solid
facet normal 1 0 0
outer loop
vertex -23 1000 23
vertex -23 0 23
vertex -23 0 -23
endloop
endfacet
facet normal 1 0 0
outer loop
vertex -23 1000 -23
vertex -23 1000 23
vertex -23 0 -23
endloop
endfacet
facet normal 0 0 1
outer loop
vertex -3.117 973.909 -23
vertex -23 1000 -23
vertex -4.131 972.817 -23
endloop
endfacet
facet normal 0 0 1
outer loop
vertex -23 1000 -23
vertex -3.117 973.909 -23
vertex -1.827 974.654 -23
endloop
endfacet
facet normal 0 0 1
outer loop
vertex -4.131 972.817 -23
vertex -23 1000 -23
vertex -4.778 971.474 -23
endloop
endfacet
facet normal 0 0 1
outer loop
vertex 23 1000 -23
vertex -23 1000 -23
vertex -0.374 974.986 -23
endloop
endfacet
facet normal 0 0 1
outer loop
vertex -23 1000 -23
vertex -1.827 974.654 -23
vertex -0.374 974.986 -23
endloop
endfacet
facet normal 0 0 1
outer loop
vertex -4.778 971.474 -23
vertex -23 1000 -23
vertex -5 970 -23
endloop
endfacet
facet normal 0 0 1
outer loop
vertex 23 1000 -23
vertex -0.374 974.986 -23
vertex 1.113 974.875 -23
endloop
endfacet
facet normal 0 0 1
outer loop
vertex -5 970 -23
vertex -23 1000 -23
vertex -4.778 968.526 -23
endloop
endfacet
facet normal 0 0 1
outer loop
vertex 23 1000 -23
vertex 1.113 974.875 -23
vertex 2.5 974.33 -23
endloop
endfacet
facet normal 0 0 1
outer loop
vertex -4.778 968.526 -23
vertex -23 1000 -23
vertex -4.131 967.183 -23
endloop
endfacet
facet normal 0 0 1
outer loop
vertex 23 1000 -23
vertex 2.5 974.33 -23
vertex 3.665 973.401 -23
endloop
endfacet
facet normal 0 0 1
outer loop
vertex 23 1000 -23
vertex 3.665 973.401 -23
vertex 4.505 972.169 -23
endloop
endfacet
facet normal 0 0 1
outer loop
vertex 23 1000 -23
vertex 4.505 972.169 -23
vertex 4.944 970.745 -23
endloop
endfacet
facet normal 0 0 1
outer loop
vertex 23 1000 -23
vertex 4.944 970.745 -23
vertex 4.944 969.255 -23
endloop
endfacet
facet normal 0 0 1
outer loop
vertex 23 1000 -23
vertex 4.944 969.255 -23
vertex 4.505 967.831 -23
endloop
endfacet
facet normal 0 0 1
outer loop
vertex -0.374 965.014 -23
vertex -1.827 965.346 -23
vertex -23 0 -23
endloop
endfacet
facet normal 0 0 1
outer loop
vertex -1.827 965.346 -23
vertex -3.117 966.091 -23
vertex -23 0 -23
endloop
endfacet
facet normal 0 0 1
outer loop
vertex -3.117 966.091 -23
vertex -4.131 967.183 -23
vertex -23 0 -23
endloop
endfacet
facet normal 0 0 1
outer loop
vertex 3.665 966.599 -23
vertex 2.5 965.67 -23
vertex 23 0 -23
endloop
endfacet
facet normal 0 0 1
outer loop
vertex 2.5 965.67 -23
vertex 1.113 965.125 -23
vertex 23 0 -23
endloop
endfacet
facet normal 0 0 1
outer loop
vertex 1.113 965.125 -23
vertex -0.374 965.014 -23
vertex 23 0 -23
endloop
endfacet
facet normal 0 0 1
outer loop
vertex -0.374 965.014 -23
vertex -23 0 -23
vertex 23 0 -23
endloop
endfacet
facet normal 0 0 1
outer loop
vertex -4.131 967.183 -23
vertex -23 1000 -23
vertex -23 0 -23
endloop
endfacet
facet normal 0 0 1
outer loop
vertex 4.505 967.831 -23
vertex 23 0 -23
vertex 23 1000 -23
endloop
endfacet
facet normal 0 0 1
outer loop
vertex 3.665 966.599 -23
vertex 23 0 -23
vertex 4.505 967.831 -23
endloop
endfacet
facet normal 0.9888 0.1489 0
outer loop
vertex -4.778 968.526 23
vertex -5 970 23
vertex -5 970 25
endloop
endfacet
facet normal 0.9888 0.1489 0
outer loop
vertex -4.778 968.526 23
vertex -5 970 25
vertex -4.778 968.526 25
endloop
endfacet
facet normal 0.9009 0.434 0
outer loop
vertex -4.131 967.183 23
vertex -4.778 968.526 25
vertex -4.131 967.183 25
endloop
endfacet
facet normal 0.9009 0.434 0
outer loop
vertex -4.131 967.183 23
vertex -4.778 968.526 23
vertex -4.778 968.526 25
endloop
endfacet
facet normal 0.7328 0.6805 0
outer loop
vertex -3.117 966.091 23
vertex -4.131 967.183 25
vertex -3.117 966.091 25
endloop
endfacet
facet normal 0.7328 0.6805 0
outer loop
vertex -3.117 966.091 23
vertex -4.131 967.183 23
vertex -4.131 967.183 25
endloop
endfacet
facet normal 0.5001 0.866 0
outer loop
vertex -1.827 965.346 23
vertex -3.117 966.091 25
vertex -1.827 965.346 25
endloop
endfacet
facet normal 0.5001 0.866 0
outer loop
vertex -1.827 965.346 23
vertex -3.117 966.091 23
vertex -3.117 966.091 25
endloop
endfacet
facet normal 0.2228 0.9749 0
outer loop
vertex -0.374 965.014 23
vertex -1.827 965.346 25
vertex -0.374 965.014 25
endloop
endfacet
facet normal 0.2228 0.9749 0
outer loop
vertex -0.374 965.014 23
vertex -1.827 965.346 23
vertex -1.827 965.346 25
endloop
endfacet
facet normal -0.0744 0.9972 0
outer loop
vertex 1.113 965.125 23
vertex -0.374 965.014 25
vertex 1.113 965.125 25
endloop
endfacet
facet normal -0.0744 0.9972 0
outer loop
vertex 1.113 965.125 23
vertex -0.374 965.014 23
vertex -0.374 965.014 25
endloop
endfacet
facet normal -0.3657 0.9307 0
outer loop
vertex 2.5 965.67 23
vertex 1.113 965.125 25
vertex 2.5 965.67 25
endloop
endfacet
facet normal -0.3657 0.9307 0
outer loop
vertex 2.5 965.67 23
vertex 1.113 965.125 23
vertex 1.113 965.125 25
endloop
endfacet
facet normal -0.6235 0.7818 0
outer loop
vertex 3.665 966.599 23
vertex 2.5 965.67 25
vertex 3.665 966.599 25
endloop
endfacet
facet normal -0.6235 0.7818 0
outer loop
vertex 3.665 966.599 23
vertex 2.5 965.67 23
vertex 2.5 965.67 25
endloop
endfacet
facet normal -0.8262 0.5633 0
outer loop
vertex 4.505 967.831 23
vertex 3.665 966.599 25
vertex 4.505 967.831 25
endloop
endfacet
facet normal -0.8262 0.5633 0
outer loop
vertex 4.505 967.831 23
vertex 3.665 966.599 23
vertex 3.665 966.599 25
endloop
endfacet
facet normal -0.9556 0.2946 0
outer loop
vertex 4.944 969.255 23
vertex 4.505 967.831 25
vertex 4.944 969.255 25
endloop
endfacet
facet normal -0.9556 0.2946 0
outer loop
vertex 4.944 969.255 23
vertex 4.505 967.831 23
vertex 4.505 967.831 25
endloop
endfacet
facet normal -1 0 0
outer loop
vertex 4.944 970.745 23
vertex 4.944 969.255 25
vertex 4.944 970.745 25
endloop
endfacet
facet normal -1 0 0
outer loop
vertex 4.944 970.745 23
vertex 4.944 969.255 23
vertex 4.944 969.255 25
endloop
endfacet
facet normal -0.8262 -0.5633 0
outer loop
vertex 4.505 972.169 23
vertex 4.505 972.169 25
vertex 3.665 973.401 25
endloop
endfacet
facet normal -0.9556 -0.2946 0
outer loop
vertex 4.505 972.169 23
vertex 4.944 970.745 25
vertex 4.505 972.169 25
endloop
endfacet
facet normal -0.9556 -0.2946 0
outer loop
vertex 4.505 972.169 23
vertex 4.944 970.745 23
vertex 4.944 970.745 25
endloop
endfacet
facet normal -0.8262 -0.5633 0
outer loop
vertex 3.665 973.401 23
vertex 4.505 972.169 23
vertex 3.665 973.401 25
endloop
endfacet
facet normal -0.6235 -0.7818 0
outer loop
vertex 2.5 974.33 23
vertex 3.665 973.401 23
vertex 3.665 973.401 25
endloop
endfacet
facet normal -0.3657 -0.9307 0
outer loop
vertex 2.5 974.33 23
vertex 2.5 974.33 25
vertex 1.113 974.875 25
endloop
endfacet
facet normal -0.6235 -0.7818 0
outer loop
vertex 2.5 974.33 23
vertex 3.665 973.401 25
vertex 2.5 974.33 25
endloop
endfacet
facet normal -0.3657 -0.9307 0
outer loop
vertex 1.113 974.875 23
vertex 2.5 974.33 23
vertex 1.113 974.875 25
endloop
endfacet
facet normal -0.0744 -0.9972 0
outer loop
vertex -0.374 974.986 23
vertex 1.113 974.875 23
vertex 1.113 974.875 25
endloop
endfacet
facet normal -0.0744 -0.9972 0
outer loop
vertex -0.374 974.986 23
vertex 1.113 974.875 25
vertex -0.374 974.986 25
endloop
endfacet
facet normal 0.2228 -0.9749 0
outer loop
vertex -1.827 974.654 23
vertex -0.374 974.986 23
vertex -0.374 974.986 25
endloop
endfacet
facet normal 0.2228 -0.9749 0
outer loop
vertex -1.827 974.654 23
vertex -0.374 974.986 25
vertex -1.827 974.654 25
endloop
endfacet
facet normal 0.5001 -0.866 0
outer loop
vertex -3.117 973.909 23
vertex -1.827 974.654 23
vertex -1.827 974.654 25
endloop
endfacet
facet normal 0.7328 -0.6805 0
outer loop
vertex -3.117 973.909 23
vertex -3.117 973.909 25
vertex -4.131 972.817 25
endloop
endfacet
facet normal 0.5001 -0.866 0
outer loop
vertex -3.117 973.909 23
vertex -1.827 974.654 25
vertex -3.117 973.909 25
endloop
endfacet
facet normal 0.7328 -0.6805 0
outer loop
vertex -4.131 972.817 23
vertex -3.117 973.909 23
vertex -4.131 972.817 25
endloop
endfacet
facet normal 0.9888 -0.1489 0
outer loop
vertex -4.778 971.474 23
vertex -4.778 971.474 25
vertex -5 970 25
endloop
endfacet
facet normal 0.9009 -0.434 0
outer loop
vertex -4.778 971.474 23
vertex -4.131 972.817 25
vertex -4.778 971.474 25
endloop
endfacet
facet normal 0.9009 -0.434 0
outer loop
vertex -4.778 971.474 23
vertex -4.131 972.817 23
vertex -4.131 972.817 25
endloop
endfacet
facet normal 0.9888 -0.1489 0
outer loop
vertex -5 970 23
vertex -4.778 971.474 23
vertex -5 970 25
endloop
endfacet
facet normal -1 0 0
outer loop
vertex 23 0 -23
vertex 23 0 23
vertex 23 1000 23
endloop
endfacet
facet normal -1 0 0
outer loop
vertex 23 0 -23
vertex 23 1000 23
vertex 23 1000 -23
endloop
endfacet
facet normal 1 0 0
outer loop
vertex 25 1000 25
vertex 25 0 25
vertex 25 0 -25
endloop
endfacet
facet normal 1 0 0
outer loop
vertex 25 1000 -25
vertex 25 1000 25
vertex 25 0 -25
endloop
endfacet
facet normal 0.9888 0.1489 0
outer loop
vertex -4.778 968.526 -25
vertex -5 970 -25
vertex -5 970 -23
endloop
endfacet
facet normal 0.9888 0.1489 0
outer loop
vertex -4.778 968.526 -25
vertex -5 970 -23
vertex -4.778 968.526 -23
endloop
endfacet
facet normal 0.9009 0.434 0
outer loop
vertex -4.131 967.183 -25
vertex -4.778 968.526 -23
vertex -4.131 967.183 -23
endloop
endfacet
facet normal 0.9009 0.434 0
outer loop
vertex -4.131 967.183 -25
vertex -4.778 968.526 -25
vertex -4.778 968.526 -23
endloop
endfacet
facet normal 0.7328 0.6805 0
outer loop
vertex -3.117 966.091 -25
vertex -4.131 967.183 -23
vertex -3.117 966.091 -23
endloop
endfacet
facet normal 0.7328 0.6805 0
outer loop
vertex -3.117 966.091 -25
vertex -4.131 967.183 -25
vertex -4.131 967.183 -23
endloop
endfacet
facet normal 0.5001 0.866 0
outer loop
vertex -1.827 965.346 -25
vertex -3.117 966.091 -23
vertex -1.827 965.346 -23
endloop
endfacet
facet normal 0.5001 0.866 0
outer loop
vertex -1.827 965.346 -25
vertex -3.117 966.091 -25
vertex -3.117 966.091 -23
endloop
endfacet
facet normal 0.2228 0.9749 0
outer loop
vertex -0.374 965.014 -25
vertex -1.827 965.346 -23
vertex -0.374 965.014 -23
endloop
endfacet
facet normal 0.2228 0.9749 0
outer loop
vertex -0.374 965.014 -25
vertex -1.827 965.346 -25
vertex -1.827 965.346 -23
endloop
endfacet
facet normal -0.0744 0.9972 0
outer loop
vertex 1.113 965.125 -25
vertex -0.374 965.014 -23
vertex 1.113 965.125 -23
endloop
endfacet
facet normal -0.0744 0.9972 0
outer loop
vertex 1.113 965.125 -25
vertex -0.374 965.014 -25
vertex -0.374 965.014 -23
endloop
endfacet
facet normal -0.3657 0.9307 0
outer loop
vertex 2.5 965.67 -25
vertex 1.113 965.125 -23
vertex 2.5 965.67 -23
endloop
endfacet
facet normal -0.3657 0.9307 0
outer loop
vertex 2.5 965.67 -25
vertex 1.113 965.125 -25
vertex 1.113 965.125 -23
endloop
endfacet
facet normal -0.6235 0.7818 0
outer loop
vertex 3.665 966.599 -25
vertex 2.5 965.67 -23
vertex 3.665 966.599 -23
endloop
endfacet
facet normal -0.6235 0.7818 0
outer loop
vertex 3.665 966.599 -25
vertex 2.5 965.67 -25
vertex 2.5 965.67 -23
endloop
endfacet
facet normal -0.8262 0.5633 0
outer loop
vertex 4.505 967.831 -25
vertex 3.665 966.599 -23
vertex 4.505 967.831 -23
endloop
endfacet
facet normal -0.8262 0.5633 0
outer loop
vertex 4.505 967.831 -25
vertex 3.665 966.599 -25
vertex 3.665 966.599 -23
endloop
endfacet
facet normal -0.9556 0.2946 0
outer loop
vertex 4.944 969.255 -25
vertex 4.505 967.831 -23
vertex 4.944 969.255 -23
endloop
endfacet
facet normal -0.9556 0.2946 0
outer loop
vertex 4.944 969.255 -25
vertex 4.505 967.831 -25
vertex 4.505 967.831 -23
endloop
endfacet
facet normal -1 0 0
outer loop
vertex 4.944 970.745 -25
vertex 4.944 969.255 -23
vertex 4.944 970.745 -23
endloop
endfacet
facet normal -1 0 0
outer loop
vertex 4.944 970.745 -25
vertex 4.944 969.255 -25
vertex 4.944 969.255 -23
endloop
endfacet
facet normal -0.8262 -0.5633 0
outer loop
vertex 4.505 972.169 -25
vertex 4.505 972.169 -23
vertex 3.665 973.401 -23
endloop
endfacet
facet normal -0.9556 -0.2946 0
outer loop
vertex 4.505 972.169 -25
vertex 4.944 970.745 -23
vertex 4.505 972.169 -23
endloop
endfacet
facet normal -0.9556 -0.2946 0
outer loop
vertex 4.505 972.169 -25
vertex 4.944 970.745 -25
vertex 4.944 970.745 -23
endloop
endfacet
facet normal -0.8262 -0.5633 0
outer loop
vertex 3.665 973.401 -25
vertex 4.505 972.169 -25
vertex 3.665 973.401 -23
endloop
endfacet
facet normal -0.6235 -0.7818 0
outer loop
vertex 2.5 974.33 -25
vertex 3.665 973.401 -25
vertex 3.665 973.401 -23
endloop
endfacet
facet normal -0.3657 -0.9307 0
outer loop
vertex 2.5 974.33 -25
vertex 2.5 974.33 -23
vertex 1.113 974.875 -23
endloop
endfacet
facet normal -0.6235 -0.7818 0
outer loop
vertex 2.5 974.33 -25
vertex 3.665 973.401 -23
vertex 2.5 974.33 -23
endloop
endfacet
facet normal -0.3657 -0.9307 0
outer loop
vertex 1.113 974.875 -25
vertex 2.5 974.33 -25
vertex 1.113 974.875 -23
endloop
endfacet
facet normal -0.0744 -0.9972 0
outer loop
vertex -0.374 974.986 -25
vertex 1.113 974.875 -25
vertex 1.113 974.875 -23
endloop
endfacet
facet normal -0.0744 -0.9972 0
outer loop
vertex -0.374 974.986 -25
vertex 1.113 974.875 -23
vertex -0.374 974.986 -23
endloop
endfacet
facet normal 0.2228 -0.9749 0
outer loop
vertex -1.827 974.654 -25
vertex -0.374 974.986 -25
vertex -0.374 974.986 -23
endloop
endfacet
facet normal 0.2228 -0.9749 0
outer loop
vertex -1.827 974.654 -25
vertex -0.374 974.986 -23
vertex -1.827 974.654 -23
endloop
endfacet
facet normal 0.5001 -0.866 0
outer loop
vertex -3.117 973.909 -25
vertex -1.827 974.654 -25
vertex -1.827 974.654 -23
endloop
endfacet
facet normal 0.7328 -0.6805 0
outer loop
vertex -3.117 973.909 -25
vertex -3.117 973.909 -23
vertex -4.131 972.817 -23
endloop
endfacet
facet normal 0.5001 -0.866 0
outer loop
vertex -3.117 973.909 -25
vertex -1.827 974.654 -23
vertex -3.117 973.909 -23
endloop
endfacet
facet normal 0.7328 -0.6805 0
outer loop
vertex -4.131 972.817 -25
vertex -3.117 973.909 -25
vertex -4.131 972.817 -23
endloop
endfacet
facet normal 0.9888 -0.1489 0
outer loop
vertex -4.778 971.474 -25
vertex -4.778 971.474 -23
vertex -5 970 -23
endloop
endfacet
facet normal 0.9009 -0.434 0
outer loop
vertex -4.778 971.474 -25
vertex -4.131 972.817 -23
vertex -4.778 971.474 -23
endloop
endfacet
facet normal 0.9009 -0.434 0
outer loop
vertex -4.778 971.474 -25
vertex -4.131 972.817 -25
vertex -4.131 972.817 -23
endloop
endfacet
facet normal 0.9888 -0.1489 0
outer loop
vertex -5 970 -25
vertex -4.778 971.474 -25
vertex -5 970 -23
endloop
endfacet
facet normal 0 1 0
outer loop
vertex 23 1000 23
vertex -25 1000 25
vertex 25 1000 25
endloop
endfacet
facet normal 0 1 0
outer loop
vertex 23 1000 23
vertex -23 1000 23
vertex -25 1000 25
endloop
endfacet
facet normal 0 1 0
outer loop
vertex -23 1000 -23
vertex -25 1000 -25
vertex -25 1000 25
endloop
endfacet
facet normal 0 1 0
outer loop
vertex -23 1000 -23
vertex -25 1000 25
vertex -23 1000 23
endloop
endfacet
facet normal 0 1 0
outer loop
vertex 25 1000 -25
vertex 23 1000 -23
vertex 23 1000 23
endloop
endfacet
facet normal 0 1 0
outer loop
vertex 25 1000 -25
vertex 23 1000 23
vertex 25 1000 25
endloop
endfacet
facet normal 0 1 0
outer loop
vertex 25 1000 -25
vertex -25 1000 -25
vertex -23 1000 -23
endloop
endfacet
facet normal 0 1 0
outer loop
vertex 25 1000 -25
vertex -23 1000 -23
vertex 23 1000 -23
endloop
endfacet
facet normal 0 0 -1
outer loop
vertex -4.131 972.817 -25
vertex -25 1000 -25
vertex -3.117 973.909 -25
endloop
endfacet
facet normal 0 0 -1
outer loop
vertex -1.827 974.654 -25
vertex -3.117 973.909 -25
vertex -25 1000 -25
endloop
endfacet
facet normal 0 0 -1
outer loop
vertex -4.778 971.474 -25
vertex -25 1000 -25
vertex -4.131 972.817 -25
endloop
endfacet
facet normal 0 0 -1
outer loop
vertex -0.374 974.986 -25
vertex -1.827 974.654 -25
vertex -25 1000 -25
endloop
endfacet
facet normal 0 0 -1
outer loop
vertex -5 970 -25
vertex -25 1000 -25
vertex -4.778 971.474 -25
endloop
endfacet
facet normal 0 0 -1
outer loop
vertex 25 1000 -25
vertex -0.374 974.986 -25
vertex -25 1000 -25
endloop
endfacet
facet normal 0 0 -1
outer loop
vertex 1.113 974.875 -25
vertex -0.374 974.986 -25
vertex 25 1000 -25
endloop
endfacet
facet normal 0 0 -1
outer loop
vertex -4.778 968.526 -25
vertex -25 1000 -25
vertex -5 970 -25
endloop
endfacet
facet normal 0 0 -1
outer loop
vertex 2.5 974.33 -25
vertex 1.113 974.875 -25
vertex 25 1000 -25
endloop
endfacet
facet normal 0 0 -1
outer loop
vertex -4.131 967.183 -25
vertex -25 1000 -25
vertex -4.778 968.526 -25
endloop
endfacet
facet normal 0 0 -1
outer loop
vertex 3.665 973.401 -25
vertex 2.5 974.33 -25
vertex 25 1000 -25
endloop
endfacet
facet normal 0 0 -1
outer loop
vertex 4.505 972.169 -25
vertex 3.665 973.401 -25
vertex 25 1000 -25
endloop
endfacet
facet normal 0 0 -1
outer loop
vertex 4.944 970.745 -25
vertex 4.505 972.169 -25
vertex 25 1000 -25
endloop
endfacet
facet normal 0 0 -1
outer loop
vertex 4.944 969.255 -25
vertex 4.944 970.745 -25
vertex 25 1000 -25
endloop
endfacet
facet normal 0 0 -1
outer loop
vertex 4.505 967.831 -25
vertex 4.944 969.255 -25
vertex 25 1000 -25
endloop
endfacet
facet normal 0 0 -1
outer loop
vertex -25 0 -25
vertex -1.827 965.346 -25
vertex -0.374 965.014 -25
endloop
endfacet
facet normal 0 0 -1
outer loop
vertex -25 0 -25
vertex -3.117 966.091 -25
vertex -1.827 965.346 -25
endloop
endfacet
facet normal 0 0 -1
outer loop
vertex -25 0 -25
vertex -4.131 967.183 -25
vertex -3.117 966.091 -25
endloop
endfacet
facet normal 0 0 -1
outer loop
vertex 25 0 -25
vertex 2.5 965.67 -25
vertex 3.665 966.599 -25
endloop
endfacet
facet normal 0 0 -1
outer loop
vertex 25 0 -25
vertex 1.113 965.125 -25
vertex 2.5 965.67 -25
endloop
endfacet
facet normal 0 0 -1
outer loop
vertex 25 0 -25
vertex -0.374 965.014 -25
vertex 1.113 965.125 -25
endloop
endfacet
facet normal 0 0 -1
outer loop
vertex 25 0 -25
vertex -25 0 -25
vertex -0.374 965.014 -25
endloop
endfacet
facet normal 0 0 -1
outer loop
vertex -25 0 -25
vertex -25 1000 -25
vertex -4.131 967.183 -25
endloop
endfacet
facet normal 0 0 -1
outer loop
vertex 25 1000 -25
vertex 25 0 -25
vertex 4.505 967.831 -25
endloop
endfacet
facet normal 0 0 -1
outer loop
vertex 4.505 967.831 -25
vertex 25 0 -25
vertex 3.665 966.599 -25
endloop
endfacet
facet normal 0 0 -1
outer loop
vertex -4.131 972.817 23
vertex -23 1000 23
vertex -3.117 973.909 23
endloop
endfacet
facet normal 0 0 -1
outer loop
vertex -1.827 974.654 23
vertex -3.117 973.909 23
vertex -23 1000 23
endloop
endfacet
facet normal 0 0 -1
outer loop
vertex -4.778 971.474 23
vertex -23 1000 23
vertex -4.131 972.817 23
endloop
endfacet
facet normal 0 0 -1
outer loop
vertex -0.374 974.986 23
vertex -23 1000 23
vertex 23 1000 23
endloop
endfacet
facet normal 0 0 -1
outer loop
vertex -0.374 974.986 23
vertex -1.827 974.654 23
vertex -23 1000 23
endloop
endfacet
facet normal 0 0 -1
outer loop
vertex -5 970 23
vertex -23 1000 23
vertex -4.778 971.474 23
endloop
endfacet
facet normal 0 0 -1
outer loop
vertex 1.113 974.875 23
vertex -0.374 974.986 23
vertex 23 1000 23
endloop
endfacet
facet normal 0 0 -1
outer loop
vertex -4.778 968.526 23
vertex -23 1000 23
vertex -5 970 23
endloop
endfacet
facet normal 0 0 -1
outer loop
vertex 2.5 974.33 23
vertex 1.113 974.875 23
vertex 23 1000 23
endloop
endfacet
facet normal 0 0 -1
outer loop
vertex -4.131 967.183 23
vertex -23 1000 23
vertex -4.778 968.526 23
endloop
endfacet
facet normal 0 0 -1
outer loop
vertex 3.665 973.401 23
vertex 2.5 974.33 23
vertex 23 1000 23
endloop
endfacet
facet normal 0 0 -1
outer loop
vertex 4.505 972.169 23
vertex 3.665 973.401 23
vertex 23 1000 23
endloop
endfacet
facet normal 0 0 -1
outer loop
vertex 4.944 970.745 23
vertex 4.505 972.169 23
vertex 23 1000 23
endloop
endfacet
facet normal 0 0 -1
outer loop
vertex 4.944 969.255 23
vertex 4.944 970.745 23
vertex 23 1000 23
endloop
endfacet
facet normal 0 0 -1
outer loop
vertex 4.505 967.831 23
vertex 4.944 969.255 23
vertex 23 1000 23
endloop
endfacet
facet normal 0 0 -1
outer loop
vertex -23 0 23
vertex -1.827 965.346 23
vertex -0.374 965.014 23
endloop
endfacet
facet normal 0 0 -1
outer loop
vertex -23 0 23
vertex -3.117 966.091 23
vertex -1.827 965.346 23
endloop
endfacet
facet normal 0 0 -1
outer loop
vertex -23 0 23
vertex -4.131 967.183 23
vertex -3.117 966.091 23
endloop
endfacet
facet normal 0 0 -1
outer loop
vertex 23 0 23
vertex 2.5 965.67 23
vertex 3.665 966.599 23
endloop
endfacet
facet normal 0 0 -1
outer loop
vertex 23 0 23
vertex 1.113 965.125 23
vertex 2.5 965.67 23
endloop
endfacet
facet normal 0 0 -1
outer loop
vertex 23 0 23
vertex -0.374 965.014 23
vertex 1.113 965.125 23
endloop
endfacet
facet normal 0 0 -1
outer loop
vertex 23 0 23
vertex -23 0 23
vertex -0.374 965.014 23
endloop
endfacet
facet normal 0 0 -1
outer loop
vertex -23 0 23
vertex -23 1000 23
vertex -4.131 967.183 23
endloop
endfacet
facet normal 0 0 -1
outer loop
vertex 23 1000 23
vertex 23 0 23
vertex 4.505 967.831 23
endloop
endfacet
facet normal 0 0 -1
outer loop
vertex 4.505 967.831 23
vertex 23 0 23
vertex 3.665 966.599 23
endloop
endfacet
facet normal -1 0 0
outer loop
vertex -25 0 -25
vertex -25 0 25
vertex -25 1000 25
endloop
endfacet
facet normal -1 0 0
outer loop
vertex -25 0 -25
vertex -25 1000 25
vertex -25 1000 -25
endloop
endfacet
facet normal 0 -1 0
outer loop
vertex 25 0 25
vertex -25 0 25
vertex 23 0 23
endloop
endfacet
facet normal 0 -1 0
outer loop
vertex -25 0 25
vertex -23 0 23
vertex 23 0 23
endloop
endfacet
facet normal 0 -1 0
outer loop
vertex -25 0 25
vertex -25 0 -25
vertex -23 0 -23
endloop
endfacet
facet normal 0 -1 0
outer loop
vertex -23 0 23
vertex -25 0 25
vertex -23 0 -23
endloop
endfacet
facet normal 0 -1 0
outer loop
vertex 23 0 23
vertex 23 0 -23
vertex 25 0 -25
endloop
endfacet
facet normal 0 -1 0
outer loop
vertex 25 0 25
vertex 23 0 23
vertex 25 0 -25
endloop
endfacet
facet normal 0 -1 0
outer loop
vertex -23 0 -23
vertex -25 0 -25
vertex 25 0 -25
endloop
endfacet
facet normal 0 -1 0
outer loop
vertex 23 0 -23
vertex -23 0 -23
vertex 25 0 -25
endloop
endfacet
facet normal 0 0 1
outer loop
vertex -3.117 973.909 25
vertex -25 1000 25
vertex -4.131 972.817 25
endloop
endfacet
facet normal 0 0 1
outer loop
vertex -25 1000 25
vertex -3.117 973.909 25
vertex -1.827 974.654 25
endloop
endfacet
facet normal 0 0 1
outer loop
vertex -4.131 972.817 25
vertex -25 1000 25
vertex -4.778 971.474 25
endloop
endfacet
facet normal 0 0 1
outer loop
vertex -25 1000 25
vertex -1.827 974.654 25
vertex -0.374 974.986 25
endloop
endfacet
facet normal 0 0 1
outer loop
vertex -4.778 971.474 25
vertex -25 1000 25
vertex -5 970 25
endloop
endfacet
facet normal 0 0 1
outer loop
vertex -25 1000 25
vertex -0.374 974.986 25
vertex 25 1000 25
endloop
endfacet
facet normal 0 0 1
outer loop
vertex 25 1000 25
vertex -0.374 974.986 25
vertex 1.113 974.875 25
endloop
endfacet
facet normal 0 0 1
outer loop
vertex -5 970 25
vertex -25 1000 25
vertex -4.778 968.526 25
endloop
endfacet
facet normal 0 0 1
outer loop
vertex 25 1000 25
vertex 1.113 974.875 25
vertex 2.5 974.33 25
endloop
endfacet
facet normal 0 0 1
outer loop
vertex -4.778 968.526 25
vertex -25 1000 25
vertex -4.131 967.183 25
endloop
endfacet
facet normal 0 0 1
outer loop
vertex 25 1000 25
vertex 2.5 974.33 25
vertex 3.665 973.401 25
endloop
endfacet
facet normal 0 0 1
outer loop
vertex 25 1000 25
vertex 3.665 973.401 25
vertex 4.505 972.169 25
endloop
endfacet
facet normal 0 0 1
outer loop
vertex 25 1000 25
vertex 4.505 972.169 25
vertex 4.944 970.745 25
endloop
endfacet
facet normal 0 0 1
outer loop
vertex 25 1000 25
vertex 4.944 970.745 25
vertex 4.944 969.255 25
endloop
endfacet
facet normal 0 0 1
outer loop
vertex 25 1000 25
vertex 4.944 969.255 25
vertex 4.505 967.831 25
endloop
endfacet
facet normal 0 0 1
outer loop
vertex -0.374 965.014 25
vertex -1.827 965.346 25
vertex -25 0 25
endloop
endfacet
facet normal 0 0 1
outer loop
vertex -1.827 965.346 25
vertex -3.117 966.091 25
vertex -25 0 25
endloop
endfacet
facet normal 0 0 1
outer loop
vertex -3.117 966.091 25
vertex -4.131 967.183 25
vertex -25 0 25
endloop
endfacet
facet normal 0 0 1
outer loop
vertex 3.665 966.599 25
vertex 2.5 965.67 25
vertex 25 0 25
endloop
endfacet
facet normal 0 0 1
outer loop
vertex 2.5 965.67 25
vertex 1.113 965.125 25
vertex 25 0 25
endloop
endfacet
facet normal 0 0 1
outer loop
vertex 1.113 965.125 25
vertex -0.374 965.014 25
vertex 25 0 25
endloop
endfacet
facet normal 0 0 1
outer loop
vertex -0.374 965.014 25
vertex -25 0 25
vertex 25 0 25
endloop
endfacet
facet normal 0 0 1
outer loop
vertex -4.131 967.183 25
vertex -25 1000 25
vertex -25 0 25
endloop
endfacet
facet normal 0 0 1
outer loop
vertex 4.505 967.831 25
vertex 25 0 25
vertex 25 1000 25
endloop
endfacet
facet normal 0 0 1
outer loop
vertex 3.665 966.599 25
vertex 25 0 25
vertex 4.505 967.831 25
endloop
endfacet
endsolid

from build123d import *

# Parameters (mm, degrees)
ESBO_O1_W                  = 50
ESBO_O1_H                  = 50
ESBO_O1_W_2                = 46
ESBO_O1_H_2                = 46
RESSALTO_EXTRUS_O1_DEPTH   = 1000
CORTE_EXTRUS_O1_DEPTH      = 1002.561281201
CORTE_EXTRUS_O1_DEPTH_BACK = 1002.561281201
ESBO_O2_R                  = 5


with BuildPart() as part:
    # Esboço1 → Ressalto-extrusão1 (new body)
    with BuildSketch(Plane(origin=(0, 0, 0), x_dir=(1, 0, 0), z_dir=(0, 1, 0))):
        Rectangle(ESBO_O1_W, ESBO_O1_H)
        Rectangle(ESBO_O1_W_2, ESBO_O1_H_2, mode=Mode.SUBTRACT)
    extrude(amount=RESSALTO_EXTRUS_O1_DEPTH)

    # Esboço2 → Corte-extrusão1 (cut, two sides: drawn at the far end of the back side and taken through both)
    with BuildSketch(Plane.XY.offset(25).offset(-CORTE_EXTRUS_O1_DEPTH_BACK)):
        with Locations(Location((0, 970, 0), (0, 0, 180))):
            Circle(ESBO_O2_R)
    extrude(amount=CORTE_EXTRUS_O1_DEPTH + CORTE_EXTRUS_O1_DEPTH_BACK, mode=Mode.SUBTRACT)


solid = part.part
